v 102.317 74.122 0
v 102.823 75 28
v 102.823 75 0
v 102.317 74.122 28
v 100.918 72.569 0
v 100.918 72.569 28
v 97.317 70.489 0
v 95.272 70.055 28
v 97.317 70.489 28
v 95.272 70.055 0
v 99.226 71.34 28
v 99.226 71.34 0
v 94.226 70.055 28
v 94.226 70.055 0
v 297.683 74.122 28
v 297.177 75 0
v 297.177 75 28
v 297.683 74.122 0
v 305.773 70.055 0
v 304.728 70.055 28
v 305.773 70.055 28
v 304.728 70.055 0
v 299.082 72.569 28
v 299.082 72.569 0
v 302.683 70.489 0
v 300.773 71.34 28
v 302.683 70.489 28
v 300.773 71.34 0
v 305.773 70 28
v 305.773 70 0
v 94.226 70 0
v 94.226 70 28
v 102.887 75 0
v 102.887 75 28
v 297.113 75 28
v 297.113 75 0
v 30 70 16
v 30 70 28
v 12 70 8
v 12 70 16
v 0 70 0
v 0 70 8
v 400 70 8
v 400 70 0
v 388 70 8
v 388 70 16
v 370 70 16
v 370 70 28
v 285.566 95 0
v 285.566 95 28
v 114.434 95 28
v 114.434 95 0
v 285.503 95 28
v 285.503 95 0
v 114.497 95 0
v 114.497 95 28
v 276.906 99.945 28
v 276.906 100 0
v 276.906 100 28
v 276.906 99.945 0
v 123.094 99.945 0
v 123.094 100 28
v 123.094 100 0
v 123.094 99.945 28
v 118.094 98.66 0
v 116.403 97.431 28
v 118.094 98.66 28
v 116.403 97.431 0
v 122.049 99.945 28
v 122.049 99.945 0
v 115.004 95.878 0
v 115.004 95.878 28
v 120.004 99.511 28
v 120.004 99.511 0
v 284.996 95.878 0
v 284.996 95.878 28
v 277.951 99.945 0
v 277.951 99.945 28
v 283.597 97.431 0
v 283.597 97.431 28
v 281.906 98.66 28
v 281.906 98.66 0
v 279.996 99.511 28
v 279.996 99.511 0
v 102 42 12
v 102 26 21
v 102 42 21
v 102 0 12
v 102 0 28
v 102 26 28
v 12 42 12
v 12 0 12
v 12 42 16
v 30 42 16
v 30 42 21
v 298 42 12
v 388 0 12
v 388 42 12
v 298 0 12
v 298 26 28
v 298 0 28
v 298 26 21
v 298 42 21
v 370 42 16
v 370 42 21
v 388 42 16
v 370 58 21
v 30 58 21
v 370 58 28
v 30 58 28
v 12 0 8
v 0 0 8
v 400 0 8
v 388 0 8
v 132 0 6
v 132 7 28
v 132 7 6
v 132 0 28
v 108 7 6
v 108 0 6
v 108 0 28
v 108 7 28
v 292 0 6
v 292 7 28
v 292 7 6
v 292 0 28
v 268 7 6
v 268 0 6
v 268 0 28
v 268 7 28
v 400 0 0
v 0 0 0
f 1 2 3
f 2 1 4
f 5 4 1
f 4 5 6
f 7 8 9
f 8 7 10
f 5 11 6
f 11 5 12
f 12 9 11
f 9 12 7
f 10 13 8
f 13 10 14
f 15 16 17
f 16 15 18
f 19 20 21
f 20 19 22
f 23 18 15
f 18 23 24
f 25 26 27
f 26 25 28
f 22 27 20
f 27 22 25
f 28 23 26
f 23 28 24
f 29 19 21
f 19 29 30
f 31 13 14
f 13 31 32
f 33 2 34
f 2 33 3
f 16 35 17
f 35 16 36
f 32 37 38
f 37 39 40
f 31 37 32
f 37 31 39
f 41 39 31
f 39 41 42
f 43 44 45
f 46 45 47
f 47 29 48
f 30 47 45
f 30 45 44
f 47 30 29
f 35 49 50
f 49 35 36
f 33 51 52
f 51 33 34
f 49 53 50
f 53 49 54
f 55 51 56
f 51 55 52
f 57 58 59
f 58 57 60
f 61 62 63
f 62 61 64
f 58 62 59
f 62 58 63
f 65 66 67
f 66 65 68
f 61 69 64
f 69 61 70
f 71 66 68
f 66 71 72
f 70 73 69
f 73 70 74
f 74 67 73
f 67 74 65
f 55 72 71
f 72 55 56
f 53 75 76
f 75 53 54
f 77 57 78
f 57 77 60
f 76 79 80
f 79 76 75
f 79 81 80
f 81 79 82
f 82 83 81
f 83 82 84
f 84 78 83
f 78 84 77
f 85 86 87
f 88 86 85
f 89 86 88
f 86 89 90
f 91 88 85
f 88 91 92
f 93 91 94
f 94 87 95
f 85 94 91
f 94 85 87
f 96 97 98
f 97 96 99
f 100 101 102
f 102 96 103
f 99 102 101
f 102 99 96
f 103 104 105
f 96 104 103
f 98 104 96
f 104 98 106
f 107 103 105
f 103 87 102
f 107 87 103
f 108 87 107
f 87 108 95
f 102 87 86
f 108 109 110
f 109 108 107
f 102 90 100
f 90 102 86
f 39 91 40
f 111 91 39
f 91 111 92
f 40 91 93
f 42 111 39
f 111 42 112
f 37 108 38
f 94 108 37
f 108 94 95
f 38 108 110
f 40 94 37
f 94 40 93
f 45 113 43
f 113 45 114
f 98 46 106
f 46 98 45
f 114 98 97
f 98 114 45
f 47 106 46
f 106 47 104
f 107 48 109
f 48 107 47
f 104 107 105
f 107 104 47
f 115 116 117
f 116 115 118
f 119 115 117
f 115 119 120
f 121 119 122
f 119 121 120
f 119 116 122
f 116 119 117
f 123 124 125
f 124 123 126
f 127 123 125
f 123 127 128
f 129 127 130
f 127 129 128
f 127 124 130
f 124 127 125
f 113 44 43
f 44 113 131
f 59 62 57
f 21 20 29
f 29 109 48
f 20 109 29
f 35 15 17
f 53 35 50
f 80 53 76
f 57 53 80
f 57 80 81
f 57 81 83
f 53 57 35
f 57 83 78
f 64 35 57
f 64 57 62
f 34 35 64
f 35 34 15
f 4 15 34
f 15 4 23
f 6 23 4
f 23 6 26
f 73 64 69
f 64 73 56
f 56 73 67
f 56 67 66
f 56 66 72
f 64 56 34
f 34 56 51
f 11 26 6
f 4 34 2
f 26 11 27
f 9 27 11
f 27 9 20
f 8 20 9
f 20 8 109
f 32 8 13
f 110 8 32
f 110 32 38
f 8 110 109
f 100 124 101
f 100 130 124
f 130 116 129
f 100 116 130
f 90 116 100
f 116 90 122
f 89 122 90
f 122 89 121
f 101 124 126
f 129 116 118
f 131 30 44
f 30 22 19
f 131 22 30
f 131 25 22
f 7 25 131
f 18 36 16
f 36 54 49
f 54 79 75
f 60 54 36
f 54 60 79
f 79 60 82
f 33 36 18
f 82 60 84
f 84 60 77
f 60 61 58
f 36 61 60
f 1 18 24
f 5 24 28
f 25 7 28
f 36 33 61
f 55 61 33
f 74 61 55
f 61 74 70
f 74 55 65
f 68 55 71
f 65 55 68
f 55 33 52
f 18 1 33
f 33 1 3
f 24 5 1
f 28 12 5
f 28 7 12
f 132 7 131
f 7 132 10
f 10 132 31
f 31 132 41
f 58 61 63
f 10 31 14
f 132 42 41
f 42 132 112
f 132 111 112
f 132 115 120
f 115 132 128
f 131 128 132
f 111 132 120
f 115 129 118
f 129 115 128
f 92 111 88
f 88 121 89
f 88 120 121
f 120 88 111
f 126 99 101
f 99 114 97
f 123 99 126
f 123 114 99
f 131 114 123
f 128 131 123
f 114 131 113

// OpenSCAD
include <../src/wardrobe.scad>;
plank_xz_front_top(wardrobe_n);
//github_openscad -o wardrobe_1/plank_xz_front_top.stl -D wardrobe_n=1 -D cutting_edge=0 -D break_view_length=0 wardrobe_1/plank_xz_front_top_stl.scad
